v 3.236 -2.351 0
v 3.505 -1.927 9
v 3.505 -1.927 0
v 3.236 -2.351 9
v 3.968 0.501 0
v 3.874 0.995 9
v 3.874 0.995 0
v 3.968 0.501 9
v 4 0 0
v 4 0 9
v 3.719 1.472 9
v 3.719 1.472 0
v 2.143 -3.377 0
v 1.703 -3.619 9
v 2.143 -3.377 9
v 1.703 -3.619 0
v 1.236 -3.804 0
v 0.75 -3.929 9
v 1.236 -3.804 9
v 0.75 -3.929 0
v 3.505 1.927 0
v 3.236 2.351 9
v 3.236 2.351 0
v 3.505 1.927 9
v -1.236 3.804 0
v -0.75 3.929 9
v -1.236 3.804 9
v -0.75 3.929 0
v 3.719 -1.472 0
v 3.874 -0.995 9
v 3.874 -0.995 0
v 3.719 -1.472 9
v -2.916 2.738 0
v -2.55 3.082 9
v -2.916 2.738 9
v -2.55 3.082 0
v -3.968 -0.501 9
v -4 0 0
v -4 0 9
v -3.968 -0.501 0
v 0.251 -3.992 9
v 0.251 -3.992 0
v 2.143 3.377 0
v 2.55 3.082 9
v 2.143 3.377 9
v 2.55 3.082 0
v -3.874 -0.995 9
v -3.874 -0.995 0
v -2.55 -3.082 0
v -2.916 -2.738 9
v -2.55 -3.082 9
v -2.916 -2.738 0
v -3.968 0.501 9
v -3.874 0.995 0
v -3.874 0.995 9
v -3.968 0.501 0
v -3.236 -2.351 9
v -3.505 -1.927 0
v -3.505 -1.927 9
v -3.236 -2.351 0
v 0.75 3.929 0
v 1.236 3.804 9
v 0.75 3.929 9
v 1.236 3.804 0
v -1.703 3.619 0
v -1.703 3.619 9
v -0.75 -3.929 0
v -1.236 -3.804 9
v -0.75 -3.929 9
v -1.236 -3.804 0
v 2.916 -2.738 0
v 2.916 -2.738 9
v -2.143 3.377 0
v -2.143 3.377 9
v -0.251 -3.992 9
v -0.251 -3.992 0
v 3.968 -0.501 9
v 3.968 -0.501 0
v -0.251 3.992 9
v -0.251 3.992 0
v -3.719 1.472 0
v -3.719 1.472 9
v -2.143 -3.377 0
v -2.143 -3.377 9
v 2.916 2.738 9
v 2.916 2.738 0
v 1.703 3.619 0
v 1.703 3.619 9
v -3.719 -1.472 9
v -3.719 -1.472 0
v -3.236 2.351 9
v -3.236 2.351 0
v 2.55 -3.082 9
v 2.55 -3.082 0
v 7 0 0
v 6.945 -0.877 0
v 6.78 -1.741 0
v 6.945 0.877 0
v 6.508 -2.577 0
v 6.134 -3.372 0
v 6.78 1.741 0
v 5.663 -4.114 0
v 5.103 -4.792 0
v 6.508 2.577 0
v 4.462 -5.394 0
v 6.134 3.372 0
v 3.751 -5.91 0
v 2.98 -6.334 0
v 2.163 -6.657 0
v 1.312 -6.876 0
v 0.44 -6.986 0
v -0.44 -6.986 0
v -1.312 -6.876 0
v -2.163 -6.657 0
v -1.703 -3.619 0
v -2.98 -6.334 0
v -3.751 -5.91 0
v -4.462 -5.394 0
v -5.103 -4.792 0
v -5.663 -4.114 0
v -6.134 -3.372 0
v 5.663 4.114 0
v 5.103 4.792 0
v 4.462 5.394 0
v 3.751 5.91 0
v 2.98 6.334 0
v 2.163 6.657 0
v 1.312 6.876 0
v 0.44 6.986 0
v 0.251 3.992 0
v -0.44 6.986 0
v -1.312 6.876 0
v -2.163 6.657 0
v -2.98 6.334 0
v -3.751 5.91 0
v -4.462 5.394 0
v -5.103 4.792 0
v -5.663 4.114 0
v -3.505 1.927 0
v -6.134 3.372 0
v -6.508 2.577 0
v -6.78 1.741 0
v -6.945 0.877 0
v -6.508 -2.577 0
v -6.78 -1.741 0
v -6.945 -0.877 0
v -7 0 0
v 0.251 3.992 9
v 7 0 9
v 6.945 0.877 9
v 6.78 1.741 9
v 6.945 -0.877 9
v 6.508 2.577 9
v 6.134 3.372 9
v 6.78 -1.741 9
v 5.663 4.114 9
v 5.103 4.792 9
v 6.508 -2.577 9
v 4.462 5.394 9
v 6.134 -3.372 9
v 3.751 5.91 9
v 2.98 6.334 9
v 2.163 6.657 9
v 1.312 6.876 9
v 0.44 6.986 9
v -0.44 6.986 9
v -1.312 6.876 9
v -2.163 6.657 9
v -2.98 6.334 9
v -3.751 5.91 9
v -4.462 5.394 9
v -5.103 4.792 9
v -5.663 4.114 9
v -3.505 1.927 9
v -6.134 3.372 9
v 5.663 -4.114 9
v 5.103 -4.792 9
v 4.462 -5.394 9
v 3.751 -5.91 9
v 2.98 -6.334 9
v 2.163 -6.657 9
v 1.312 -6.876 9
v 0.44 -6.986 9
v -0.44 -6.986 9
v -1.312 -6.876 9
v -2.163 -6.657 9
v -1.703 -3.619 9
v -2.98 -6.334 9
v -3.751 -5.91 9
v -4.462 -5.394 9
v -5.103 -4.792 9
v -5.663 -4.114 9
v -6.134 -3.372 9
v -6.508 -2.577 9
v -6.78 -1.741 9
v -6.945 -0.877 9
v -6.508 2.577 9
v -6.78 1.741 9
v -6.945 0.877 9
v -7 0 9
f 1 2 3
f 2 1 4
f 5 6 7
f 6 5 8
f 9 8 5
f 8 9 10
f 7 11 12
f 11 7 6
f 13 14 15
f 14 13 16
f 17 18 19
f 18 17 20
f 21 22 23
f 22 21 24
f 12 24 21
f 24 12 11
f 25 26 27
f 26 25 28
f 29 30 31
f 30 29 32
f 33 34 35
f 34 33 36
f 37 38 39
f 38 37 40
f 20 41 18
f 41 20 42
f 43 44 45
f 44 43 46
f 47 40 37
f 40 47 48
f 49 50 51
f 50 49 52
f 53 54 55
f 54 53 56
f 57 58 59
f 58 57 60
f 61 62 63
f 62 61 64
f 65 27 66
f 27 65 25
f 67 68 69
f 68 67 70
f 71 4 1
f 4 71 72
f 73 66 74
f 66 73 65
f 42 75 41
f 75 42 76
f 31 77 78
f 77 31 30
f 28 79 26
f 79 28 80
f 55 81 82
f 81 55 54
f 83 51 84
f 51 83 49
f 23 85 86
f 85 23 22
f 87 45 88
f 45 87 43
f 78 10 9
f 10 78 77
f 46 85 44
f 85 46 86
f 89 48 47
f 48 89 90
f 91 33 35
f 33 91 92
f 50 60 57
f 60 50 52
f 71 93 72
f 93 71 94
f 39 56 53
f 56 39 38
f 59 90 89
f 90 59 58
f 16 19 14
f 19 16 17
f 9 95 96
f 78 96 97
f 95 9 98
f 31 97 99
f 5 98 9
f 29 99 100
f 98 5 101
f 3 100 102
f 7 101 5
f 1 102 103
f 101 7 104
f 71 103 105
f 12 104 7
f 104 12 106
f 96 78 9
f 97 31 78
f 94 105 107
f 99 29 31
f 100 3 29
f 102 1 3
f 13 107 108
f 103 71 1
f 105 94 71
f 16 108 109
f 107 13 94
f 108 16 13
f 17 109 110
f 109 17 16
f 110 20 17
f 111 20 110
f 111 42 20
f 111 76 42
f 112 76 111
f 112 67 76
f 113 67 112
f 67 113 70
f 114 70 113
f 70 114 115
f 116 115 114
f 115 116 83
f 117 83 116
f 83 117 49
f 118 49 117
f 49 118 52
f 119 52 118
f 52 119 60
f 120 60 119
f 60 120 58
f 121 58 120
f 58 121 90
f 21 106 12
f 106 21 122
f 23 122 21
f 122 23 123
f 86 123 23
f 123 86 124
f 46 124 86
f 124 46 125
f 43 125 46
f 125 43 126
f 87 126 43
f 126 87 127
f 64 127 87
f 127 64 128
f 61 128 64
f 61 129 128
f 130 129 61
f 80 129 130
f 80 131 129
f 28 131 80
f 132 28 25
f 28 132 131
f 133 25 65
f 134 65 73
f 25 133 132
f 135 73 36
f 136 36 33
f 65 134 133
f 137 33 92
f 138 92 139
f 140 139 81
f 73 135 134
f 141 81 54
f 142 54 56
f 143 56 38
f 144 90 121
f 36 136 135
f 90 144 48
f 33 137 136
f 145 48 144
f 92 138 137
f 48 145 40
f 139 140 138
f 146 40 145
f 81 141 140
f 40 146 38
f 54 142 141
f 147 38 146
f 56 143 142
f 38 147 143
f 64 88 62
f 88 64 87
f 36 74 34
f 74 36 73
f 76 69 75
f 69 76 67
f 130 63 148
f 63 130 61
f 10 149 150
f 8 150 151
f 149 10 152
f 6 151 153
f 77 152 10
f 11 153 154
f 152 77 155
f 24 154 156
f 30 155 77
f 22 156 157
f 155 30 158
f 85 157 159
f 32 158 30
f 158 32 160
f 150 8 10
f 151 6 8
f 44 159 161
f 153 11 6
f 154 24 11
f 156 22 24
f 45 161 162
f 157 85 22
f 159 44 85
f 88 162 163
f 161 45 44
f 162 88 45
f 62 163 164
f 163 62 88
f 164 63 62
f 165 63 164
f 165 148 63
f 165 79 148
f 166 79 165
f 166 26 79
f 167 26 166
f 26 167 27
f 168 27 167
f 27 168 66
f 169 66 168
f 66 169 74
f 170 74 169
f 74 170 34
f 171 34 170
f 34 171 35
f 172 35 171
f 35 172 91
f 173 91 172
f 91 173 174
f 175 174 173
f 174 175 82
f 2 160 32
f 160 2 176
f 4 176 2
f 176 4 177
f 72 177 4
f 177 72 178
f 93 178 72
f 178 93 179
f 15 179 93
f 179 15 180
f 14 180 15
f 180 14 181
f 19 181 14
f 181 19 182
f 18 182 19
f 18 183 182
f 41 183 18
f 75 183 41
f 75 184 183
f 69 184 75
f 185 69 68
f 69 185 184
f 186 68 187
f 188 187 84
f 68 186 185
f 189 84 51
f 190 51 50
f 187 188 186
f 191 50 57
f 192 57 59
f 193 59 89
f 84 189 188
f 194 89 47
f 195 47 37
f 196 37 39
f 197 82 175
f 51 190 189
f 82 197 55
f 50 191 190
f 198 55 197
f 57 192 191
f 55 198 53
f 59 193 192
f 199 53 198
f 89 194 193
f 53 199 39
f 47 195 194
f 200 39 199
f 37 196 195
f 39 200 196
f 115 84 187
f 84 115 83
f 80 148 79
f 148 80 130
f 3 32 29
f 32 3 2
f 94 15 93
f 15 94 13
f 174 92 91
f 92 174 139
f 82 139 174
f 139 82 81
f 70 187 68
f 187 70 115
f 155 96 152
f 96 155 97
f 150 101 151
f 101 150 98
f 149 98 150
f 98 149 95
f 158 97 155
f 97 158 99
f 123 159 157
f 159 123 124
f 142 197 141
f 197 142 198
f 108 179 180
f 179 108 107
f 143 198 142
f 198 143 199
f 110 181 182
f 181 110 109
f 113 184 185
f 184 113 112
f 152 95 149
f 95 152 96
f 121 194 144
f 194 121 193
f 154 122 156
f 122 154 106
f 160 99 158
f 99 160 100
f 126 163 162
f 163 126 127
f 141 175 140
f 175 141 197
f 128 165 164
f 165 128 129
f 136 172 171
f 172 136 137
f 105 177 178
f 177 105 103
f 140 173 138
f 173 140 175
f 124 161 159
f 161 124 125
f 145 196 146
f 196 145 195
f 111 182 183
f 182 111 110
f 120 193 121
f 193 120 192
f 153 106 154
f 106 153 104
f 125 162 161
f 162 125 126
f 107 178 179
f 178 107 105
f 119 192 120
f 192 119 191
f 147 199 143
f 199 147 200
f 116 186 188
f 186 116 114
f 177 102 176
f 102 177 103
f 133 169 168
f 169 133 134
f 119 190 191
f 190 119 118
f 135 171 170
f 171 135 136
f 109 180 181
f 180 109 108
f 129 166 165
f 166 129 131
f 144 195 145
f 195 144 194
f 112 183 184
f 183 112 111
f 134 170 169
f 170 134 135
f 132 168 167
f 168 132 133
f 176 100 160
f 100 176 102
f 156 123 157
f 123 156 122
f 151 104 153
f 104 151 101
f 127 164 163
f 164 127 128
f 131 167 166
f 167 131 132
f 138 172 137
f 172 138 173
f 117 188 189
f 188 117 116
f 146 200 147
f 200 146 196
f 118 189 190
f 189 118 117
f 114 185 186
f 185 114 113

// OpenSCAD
$fn = 50;


difference() {
	union() {
		cylinder(h = 9, r = 7.0000000000);
	}
	union() {
		#translate(v = [0.0000000000, 0.0000000000, -100.0000000000]) {
			cylinder(h = 200, r = 3.2500000000);
		}
		#translate(v = [0.0000000000, 0.0000000000, -100.0000000000]) {
			cylinder(h = 200, r = 3.2500000000);
		}
		#translate(v = [0.0000000000, 0.0000000000, -100.0000000000]) {
			cylinder(h = 200, r = 3.2500000000);
		}
		#translate(v = [0.0000000000, 0.0000000000, -100.0000000000]) {
			cylinder(h = 200, r = 3.2500000000);
		}
		#cylinder(h = 9, r = 4.0000000000);
	}
}
